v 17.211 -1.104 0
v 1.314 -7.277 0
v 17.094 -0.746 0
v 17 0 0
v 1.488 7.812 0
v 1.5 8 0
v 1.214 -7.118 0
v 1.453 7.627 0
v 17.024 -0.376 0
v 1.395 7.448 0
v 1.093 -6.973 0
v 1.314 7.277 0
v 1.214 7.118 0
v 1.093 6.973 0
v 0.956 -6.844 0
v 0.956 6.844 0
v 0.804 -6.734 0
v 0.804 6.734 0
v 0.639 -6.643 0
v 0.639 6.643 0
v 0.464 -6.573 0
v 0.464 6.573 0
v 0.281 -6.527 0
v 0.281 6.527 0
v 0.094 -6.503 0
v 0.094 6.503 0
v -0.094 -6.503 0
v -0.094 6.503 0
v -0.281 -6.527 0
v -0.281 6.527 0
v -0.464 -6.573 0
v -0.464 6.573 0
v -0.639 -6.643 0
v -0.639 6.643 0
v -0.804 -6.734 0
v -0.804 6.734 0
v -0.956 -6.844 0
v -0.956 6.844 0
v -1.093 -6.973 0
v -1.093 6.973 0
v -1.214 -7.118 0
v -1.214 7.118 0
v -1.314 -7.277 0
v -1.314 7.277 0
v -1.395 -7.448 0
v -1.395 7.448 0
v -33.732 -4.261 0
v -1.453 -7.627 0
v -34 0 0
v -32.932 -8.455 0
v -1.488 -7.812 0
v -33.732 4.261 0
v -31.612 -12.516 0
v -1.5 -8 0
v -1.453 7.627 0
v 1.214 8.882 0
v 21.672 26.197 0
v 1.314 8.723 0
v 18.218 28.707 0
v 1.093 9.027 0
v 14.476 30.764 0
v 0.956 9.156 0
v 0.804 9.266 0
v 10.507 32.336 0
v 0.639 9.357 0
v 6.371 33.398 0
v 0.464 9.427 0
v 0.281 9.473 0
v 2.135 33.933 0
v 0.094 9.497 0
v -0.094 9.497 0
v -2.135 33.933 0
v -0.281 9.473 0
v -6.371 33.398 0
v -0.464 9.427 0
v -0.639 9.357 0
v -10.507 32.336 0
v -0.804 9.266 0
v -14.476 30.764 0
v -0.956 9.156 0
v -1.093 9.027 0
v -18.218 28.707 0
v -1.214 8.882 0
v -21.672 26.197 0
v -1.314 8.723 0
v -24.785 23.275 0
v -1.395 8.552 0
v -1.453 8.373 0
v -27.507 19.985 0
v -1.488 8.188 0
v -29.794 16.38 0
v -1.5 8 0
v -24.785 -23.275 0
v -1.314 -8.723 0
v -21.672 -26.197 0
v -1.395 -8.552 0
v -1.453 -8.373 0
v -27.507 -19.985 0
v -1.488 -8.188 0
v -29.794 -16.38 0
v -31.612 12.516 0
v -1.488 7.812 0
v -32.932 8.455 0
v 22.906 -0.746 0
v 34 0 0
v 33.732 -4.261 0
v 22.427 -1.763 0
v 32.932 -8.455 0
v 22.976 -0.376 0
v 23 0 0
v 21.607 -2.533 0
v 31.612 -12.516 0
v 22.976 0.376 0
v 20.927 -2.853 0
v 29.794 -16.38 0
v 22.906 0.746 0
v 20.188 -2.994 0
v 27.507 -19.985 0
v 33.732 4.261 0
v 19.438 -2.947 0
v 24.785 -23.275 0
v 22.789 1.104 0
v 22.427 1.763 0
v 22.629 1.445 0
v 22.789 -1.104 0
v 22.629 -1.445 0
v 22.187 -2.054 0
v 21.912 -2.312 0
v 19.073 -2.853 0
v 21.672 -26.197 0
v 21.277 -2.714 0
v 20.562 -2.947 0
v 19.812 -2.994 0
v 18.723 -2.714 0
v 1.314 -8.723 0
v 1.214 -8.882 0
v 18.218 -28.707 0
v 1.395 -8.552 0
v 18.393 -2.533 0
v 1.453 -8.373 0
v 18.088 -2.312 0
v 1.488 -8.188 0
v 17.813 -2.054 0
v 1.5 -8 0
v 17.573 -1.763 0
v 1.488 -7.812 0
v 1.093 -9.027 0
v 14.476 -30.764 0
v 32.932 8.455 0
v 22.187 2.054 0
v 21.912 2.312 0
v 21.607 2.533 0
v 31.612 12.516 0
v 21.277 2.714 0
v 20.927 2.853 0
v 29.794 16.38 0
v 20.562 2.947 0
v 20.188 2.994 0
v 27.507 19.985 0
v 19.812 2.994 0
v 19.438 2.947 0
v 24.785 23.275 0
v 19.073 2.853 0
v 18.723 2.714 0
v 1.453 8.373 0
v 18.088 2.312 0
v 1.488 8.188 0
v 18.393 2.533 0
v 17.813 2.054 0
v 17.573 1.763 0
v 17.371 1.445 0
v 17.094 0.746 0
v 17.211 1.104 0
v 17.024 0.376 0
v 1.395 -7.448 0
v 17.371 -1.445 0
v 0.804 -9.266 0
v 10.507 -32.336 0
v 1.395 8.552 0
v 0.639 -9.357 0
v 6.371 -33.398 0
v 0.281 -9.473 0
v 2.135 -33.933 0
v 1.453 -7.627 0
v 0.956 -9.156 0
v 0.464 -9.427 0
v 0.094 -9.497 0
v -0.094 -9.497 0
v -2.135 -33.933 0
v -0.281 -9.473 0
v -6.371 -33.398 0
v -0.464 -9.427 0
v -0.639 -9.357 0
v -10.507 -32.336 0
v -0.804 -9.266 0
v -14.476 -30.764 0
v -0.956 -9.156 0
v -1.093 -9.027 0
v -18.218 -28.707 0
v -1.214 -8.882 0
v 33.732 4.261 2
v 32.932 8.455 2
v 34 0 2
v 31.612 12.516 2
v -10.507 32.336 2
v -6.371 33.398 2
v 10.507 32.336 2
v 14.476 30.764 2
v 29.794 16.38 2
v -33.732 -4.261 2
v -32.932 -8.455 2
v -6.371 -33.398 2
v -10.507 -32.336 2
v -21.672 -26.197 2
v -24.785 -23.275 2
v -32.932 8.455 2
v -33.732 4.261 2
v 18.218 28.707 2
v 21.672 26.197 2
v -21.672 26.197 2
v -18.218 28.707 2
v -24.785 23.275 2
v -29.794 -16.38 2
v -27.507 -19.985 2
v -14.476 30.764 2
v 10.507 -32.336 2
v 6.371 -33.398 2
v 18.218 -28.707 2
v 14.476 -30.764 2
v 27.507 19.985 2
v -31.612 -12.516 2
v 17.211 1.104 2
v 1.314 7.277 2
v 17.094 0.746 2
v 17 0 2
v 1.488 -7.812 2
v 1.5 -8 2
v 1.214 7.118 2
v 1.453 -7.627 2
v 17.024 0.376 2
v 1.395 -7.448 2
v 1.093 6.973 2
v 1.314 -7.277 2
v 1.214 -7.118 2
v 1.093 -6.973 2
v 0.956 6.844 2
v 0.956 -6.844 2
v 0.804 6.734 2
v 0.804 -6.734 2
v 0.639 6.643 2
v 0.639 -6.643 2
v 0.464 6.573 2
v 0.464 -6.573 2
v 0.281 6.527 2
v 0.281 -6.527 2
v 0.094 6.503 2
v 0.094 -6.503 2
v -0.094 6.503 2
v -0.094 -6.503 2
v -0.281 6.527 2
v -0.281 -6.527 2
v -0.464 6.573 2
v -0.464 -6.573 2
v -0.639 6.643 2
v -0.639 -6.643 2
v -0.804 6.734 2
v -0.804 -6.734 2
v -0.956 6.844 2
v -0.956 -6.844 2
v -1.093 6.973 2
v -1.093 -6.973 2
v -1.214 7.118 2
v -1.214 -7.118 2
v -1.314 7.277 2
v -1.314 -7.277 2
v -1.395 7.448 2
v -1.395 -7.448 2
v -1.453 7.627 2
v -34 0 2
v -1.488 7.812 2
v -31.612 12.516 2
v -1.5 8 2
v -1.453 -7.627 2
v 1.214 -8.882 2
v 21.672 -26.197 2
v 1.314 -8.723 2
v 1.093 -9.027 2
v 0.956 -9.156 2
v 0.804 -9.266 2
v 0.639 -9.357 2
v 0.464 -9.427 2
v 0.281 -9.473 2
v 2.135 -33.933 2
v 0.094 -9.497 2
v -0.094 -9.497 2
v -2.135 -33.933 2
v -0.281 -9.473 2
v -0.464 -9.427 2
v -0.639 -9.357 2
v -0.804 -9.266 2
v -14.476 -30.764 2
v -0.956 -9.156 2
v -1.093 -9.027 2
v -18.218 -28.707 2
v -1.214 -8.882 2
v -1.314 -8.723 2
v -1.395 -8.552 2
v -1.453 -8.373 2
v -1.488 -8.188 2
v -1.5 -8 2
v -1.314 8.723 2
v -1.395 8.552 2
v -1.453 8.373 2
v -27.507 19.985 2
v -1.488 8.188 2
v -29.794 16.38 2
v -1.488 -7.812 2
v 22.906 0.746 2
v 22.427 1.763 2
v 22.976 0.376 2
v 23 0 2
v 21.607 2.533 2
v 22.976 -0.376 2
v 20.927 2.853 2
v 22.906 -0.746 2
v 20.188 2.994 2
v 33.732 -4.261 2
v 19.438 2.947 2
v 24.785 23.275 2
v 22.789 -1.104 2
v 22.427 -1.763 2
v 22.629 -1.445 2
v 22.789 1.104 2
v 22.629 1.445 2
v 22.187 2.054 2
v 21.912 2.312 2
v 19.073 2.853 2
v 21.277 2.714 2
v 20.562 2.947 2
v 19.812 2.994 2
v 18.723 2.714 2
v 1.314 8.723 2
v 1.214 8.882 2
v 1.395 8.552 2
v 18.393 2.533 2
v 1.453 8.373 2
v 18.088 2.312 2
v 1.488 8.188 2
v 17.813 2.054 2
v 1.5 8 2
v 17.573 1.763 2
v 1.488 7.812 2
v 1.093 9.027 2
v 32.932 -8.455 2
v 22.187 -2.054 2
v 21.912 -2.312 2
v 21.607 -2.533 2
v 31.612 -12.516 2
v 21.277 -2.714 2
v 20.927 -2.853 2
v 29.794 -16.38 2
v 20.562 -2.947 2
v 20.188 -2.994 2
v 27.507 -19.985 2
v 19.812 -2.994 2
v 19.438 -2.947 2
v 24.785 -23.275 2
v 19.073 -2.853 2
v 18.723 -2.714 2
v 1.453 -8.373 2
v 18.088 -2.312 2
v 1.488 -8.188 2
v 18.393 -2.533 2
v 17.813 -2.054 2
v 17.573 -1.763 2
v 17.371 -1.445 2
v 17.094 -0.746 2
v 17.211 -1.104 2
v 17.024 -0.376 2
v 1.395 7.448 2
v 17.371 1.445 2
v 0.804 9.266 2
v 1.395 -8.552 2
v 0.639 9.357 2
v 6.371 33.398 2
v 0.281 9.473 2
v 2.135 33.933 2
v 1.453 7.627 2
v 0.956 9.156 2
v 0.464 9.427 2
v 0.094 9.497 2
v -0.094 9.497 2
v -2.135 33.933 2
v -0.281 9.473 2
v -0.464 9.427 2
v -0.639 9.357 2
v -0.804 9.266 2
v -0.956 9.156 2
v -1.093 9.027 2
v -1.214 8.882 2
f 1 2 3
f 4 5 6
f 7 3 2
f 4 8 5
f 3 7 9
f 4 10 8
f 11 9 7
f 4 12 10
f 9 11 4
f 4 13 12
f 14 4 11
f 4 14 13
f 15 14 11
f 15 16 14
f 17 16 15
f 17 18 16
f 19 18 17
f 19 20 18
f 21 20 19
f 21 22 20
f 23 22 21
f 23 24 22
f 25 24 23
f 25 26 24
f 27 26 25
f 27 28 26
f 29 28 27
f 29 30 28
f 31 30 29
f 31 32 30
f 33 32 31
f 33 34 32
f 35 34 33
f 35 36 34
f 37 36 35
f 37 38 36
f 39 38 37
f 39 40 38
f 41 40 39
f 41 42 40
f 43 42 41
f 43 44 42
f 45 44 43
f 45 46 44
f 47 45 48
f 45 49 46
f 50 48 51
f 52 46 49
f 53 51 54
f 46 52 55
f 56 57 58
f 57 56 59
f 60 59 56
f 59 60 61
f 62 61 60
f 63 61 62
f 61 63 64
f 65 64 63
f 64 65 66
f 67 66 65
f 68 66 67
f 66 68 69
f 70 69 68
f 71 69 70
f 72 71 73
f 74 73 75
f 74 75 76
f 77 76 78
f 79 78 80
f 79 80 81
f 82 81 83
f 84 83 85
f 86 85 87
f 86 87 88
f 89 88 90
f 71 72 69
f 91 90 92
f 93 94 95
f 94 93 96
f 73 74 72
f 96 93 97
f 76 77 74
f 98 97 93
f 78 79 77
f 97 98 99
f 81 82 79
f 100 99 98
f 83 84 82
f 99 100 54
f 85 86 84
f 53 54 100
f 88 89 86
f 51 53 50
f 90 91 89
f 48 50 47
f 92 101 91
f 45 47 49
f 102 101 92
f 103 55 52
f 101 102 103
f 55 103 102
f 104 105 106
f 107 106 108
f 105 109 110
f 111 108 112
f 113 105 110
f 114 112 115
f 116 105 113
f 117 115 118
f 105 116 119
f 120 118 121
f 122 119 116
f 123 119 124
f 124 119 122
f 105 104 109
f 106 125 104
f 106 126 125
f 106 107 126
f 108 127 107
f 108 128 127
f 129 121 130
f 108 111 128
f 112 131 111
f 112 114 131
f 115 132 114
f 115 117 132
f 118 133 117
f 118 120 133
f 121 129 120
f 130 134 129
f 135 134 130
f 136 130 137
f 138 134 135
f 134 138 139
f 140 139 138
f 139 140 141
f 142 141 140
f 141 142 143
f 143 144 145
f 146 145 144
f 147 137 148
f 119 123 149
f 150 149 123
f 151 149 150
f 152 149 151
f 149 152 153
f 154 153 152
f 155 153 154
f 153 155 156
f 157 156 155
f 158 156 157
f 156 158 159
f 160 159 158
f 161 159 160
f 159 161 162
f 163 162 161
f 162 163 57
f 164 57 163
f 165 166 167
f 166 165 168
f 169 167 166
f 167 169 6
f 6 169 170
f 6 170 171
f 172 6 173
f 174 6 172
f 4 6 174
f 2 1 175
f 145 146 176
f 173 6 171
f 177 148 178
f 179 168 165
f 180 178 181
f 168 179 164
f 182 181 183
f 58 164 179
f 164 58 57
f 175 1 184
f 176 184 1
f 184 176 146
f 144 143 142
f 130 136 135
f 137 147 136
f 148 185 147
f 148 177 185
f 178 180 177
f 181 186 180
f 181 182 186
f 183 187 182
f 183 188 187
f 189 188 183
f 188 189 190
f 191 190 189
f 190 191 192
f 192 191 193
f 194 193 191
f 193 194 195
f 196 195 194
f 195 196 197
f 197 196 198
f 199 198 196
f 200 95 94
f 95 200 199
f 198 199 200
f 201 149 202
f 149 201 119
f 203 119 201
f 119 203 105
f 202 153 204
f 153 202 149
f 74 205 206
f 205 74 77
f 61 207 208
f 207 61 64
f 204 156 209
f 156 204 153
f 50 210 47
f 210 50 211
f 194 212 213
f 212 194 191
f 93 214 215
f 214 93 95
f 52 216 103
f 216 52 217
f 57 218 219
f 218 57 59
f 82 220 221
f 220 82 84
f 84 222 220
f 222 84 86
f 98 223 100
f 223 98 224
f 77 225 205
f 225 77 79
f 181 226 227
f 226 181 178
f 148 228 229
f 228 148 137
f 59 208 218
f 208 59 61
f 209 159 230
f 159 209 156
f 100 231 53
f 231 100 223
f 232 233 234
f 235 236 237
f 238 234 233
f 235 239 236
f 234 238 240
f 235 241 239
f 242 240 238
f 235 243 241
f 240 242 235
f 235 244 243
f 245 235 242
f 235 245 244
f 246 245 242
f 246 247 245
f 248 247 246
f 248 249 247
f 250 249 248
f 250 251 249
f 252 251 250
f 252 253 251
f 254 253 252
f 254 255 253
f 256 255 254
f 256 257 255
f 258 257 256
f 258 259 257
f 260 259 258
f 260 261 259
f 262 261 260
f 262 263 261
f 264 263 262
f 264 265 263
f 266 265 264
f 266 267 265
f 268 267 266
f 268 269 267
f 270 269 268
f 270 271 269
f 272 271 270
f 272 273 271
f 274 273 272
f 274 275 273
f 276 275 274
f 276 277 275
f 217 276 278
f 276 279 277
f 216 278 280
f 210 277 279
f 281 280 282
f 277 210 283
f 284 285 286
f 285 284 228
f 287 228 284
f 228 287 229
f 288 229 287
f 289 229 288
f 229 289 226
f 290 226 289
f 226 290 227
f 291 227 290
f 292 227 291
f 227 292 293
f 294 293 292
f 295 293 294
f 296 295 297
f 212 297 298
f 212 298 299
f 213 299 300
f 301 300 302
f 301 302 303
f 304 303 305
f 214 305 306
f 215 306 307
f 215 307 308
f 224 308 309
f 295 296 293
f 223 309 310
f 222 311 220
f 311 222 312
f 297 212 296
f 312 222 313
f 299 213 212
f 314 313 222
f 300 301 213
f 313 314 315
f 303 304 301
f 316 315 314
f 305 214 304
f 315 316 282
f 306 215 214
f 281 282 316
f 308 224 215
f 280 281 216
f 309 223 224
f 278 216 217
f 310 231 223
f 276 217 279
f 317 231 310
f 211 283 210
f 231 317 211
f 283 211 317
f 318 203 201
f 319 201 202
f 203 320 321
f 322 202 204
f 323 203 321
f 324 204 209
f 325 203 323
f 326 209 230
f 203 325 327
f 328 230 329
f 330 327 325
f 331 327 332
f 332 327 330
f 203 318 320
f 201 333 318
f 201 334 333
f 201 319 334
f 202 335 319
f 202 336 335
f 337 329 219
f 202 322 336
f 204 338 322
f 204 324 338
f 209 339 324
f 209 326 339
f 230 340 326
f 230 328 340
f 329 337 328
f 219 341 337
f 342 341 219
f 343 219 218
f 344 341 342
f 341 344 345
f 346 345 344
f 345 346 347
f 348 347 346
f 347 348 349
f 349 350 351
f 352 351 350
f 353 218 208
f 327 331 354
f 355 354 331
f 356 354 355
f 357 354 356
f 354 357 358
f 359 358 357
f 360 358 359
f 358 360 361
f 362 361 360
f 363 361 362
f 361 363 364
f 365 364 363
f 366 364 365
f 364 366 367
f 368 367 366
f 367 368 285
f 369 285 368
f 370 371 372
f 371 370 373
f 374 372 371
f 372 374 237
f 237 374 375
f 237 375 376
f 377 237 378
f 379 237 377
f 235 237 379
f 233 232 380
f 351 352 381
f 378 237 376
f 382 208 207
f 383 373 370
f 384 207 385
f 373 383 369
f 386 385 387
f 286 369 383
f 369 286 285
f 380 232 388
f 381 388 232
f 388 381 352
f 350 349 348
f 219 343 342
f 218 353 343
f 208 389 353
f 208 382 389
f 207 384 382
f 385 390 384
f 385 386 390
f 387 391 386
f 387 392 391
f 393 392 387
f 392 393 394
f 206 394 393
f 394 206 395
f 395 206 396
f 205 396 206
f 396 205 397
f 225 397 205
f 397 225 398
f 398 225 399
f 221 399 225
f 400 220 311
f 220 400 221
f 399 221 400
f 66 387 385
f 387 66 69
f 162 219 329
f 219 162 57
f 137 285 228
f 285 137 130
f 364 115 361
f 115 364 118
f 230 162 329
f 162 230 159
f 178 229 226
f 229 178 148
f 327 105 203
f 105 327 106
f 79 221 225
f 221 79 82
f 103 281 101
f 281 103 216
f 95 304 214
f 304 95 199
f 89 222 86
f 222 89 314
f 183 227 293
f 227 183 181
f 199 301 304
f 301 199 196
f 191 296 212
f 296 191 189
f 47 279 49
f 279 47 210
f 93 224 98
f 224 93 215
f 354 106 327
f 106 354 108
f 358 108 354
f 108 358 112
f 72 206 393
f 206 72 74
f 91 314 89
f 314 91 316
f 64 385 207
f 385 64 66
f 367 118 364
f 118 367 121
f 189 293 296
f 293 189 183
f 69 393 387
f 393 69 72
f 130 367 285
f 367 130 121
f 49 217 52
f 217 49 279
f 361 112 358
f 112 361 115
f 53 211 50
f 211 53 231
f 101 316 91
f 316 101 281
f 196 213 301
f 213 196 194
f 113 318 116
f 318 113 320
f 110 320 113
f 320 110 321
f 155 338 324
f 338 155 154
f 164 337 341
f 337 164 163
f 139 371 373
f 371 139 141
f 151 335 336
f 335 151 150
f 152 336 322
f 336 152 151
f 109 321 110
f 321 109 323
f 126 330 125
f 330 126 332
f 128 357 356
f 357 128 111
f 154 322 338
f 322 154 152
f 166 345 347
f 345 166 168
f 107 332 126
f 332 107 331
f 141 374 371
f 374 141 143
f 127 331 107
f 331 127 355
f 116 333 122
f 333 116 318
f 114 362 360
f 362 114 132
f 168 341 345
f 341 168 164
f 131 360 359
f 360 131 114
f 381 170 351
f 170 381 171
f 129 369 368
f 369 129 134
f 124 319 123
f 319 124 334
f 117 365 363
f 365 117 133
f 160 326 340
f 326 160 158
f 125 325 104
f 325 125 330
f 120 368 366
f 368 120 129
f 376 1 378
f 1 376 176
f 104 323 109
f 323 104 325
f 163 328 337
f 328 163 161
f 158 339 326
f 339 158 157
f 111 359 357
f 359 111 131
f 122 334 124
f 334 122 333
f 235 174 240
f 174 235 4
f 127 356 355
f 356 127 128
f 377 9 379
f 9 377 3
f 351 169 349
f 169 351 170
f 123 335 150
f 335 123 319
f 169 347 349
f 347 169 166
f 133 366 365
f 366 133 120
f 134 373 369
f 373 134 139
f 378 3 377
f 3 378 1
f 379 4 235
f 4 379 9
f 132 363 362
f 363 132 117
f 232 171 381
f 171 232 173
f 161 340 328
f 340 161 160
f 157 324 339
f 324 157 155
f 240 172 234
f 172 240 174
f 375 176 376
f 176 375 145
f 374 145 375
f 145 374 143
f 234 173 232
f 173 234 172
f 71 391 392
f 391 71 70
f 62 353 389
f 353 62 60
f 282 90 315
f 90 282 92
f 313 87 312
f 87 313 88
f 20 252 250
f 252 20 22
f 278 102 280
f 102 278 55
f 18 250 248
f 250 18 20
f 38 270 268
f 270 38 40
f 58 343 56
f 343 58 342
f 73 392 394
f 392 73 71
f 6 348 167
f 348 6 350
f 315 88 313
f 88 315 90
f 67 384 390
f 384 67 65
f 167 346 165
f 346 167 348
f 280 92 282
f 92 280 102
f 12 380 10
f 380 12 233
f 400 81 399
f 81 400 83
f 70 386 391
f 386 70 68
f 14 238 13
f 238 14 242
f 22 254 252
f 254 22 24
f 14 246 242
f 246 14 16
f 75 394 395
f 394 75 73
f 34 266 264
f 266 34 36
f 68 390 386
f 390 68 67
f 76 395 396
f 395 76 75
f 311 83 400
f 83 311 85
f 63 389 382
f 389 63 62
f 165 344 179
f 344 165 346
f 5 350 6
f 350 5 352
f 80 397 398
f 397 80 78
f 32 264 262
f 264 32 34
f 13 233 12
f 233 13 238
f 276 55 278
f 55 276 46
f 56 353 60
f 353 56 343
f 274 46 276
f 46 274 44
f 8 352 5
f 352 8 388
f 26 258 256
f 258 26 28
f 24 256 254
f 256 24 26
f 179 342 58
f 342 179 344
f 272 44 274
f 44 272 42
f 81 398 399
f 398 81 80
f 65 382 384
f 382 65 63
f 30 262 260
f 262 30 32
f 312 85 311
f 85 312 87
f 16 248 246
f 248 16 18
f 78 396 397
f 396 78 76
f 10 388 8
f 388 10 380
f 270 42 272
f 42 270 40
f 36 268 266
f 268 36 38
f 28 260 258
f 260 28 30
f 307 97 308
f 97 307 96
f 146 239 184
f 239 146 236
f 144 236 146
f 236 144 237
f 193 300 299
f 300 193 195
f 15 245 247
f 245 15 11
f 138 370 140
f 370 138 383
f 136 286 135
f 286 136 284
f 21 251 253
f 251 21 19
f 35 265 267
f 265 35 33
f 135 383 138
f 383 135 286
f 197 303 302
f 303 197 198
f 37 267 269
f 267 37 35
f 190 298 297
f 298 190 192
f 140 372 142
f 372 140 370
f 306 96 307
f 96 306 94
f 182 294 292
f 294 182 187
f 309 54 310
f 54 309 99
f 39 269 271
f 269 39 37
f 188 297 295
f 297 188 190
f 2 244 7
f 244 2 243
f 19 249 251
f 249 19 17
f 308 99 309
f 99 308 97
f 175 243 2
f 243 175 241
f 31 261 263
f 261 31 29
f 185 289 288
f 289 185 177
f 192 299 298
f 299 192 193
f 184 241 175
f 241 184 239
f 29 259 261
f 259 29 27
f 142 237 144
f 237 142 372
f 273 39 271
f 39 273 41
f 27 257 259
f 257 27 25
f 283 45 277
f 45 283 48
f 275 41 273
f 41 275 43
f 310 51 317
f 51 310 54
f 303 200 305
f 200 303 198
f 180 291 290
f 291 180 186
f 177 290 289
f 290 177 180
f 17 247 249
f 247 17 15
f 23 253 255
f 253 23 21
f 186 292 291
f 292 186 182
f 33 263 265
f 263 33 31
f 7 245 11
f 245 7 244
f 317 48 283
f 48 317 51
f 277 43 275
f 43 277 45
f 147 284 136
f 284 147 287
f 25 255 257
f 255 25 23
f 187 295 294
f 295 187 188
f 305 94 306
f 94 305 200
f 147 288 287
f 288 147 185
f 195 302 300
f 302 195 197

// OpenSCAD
$fn = 50; // smoothness 
sh = 11;
bh = 3;

difference() {
  translate( [0,0,0] ) {
      cylinder( r=68/2, h=2 ); 
  }
	// m6 threaded hole for HPLC fitting
	translate( [60/3,0,-0.01] ) cylinder( r=3,h=10 );
	// holes for pistons
	translate( [0, 8,-0.01] ) cylinder( r=1.5,h=10 );
	translate( [0,-8,-0.01] ) cylinder( r=1.5,h=10 );	
}
